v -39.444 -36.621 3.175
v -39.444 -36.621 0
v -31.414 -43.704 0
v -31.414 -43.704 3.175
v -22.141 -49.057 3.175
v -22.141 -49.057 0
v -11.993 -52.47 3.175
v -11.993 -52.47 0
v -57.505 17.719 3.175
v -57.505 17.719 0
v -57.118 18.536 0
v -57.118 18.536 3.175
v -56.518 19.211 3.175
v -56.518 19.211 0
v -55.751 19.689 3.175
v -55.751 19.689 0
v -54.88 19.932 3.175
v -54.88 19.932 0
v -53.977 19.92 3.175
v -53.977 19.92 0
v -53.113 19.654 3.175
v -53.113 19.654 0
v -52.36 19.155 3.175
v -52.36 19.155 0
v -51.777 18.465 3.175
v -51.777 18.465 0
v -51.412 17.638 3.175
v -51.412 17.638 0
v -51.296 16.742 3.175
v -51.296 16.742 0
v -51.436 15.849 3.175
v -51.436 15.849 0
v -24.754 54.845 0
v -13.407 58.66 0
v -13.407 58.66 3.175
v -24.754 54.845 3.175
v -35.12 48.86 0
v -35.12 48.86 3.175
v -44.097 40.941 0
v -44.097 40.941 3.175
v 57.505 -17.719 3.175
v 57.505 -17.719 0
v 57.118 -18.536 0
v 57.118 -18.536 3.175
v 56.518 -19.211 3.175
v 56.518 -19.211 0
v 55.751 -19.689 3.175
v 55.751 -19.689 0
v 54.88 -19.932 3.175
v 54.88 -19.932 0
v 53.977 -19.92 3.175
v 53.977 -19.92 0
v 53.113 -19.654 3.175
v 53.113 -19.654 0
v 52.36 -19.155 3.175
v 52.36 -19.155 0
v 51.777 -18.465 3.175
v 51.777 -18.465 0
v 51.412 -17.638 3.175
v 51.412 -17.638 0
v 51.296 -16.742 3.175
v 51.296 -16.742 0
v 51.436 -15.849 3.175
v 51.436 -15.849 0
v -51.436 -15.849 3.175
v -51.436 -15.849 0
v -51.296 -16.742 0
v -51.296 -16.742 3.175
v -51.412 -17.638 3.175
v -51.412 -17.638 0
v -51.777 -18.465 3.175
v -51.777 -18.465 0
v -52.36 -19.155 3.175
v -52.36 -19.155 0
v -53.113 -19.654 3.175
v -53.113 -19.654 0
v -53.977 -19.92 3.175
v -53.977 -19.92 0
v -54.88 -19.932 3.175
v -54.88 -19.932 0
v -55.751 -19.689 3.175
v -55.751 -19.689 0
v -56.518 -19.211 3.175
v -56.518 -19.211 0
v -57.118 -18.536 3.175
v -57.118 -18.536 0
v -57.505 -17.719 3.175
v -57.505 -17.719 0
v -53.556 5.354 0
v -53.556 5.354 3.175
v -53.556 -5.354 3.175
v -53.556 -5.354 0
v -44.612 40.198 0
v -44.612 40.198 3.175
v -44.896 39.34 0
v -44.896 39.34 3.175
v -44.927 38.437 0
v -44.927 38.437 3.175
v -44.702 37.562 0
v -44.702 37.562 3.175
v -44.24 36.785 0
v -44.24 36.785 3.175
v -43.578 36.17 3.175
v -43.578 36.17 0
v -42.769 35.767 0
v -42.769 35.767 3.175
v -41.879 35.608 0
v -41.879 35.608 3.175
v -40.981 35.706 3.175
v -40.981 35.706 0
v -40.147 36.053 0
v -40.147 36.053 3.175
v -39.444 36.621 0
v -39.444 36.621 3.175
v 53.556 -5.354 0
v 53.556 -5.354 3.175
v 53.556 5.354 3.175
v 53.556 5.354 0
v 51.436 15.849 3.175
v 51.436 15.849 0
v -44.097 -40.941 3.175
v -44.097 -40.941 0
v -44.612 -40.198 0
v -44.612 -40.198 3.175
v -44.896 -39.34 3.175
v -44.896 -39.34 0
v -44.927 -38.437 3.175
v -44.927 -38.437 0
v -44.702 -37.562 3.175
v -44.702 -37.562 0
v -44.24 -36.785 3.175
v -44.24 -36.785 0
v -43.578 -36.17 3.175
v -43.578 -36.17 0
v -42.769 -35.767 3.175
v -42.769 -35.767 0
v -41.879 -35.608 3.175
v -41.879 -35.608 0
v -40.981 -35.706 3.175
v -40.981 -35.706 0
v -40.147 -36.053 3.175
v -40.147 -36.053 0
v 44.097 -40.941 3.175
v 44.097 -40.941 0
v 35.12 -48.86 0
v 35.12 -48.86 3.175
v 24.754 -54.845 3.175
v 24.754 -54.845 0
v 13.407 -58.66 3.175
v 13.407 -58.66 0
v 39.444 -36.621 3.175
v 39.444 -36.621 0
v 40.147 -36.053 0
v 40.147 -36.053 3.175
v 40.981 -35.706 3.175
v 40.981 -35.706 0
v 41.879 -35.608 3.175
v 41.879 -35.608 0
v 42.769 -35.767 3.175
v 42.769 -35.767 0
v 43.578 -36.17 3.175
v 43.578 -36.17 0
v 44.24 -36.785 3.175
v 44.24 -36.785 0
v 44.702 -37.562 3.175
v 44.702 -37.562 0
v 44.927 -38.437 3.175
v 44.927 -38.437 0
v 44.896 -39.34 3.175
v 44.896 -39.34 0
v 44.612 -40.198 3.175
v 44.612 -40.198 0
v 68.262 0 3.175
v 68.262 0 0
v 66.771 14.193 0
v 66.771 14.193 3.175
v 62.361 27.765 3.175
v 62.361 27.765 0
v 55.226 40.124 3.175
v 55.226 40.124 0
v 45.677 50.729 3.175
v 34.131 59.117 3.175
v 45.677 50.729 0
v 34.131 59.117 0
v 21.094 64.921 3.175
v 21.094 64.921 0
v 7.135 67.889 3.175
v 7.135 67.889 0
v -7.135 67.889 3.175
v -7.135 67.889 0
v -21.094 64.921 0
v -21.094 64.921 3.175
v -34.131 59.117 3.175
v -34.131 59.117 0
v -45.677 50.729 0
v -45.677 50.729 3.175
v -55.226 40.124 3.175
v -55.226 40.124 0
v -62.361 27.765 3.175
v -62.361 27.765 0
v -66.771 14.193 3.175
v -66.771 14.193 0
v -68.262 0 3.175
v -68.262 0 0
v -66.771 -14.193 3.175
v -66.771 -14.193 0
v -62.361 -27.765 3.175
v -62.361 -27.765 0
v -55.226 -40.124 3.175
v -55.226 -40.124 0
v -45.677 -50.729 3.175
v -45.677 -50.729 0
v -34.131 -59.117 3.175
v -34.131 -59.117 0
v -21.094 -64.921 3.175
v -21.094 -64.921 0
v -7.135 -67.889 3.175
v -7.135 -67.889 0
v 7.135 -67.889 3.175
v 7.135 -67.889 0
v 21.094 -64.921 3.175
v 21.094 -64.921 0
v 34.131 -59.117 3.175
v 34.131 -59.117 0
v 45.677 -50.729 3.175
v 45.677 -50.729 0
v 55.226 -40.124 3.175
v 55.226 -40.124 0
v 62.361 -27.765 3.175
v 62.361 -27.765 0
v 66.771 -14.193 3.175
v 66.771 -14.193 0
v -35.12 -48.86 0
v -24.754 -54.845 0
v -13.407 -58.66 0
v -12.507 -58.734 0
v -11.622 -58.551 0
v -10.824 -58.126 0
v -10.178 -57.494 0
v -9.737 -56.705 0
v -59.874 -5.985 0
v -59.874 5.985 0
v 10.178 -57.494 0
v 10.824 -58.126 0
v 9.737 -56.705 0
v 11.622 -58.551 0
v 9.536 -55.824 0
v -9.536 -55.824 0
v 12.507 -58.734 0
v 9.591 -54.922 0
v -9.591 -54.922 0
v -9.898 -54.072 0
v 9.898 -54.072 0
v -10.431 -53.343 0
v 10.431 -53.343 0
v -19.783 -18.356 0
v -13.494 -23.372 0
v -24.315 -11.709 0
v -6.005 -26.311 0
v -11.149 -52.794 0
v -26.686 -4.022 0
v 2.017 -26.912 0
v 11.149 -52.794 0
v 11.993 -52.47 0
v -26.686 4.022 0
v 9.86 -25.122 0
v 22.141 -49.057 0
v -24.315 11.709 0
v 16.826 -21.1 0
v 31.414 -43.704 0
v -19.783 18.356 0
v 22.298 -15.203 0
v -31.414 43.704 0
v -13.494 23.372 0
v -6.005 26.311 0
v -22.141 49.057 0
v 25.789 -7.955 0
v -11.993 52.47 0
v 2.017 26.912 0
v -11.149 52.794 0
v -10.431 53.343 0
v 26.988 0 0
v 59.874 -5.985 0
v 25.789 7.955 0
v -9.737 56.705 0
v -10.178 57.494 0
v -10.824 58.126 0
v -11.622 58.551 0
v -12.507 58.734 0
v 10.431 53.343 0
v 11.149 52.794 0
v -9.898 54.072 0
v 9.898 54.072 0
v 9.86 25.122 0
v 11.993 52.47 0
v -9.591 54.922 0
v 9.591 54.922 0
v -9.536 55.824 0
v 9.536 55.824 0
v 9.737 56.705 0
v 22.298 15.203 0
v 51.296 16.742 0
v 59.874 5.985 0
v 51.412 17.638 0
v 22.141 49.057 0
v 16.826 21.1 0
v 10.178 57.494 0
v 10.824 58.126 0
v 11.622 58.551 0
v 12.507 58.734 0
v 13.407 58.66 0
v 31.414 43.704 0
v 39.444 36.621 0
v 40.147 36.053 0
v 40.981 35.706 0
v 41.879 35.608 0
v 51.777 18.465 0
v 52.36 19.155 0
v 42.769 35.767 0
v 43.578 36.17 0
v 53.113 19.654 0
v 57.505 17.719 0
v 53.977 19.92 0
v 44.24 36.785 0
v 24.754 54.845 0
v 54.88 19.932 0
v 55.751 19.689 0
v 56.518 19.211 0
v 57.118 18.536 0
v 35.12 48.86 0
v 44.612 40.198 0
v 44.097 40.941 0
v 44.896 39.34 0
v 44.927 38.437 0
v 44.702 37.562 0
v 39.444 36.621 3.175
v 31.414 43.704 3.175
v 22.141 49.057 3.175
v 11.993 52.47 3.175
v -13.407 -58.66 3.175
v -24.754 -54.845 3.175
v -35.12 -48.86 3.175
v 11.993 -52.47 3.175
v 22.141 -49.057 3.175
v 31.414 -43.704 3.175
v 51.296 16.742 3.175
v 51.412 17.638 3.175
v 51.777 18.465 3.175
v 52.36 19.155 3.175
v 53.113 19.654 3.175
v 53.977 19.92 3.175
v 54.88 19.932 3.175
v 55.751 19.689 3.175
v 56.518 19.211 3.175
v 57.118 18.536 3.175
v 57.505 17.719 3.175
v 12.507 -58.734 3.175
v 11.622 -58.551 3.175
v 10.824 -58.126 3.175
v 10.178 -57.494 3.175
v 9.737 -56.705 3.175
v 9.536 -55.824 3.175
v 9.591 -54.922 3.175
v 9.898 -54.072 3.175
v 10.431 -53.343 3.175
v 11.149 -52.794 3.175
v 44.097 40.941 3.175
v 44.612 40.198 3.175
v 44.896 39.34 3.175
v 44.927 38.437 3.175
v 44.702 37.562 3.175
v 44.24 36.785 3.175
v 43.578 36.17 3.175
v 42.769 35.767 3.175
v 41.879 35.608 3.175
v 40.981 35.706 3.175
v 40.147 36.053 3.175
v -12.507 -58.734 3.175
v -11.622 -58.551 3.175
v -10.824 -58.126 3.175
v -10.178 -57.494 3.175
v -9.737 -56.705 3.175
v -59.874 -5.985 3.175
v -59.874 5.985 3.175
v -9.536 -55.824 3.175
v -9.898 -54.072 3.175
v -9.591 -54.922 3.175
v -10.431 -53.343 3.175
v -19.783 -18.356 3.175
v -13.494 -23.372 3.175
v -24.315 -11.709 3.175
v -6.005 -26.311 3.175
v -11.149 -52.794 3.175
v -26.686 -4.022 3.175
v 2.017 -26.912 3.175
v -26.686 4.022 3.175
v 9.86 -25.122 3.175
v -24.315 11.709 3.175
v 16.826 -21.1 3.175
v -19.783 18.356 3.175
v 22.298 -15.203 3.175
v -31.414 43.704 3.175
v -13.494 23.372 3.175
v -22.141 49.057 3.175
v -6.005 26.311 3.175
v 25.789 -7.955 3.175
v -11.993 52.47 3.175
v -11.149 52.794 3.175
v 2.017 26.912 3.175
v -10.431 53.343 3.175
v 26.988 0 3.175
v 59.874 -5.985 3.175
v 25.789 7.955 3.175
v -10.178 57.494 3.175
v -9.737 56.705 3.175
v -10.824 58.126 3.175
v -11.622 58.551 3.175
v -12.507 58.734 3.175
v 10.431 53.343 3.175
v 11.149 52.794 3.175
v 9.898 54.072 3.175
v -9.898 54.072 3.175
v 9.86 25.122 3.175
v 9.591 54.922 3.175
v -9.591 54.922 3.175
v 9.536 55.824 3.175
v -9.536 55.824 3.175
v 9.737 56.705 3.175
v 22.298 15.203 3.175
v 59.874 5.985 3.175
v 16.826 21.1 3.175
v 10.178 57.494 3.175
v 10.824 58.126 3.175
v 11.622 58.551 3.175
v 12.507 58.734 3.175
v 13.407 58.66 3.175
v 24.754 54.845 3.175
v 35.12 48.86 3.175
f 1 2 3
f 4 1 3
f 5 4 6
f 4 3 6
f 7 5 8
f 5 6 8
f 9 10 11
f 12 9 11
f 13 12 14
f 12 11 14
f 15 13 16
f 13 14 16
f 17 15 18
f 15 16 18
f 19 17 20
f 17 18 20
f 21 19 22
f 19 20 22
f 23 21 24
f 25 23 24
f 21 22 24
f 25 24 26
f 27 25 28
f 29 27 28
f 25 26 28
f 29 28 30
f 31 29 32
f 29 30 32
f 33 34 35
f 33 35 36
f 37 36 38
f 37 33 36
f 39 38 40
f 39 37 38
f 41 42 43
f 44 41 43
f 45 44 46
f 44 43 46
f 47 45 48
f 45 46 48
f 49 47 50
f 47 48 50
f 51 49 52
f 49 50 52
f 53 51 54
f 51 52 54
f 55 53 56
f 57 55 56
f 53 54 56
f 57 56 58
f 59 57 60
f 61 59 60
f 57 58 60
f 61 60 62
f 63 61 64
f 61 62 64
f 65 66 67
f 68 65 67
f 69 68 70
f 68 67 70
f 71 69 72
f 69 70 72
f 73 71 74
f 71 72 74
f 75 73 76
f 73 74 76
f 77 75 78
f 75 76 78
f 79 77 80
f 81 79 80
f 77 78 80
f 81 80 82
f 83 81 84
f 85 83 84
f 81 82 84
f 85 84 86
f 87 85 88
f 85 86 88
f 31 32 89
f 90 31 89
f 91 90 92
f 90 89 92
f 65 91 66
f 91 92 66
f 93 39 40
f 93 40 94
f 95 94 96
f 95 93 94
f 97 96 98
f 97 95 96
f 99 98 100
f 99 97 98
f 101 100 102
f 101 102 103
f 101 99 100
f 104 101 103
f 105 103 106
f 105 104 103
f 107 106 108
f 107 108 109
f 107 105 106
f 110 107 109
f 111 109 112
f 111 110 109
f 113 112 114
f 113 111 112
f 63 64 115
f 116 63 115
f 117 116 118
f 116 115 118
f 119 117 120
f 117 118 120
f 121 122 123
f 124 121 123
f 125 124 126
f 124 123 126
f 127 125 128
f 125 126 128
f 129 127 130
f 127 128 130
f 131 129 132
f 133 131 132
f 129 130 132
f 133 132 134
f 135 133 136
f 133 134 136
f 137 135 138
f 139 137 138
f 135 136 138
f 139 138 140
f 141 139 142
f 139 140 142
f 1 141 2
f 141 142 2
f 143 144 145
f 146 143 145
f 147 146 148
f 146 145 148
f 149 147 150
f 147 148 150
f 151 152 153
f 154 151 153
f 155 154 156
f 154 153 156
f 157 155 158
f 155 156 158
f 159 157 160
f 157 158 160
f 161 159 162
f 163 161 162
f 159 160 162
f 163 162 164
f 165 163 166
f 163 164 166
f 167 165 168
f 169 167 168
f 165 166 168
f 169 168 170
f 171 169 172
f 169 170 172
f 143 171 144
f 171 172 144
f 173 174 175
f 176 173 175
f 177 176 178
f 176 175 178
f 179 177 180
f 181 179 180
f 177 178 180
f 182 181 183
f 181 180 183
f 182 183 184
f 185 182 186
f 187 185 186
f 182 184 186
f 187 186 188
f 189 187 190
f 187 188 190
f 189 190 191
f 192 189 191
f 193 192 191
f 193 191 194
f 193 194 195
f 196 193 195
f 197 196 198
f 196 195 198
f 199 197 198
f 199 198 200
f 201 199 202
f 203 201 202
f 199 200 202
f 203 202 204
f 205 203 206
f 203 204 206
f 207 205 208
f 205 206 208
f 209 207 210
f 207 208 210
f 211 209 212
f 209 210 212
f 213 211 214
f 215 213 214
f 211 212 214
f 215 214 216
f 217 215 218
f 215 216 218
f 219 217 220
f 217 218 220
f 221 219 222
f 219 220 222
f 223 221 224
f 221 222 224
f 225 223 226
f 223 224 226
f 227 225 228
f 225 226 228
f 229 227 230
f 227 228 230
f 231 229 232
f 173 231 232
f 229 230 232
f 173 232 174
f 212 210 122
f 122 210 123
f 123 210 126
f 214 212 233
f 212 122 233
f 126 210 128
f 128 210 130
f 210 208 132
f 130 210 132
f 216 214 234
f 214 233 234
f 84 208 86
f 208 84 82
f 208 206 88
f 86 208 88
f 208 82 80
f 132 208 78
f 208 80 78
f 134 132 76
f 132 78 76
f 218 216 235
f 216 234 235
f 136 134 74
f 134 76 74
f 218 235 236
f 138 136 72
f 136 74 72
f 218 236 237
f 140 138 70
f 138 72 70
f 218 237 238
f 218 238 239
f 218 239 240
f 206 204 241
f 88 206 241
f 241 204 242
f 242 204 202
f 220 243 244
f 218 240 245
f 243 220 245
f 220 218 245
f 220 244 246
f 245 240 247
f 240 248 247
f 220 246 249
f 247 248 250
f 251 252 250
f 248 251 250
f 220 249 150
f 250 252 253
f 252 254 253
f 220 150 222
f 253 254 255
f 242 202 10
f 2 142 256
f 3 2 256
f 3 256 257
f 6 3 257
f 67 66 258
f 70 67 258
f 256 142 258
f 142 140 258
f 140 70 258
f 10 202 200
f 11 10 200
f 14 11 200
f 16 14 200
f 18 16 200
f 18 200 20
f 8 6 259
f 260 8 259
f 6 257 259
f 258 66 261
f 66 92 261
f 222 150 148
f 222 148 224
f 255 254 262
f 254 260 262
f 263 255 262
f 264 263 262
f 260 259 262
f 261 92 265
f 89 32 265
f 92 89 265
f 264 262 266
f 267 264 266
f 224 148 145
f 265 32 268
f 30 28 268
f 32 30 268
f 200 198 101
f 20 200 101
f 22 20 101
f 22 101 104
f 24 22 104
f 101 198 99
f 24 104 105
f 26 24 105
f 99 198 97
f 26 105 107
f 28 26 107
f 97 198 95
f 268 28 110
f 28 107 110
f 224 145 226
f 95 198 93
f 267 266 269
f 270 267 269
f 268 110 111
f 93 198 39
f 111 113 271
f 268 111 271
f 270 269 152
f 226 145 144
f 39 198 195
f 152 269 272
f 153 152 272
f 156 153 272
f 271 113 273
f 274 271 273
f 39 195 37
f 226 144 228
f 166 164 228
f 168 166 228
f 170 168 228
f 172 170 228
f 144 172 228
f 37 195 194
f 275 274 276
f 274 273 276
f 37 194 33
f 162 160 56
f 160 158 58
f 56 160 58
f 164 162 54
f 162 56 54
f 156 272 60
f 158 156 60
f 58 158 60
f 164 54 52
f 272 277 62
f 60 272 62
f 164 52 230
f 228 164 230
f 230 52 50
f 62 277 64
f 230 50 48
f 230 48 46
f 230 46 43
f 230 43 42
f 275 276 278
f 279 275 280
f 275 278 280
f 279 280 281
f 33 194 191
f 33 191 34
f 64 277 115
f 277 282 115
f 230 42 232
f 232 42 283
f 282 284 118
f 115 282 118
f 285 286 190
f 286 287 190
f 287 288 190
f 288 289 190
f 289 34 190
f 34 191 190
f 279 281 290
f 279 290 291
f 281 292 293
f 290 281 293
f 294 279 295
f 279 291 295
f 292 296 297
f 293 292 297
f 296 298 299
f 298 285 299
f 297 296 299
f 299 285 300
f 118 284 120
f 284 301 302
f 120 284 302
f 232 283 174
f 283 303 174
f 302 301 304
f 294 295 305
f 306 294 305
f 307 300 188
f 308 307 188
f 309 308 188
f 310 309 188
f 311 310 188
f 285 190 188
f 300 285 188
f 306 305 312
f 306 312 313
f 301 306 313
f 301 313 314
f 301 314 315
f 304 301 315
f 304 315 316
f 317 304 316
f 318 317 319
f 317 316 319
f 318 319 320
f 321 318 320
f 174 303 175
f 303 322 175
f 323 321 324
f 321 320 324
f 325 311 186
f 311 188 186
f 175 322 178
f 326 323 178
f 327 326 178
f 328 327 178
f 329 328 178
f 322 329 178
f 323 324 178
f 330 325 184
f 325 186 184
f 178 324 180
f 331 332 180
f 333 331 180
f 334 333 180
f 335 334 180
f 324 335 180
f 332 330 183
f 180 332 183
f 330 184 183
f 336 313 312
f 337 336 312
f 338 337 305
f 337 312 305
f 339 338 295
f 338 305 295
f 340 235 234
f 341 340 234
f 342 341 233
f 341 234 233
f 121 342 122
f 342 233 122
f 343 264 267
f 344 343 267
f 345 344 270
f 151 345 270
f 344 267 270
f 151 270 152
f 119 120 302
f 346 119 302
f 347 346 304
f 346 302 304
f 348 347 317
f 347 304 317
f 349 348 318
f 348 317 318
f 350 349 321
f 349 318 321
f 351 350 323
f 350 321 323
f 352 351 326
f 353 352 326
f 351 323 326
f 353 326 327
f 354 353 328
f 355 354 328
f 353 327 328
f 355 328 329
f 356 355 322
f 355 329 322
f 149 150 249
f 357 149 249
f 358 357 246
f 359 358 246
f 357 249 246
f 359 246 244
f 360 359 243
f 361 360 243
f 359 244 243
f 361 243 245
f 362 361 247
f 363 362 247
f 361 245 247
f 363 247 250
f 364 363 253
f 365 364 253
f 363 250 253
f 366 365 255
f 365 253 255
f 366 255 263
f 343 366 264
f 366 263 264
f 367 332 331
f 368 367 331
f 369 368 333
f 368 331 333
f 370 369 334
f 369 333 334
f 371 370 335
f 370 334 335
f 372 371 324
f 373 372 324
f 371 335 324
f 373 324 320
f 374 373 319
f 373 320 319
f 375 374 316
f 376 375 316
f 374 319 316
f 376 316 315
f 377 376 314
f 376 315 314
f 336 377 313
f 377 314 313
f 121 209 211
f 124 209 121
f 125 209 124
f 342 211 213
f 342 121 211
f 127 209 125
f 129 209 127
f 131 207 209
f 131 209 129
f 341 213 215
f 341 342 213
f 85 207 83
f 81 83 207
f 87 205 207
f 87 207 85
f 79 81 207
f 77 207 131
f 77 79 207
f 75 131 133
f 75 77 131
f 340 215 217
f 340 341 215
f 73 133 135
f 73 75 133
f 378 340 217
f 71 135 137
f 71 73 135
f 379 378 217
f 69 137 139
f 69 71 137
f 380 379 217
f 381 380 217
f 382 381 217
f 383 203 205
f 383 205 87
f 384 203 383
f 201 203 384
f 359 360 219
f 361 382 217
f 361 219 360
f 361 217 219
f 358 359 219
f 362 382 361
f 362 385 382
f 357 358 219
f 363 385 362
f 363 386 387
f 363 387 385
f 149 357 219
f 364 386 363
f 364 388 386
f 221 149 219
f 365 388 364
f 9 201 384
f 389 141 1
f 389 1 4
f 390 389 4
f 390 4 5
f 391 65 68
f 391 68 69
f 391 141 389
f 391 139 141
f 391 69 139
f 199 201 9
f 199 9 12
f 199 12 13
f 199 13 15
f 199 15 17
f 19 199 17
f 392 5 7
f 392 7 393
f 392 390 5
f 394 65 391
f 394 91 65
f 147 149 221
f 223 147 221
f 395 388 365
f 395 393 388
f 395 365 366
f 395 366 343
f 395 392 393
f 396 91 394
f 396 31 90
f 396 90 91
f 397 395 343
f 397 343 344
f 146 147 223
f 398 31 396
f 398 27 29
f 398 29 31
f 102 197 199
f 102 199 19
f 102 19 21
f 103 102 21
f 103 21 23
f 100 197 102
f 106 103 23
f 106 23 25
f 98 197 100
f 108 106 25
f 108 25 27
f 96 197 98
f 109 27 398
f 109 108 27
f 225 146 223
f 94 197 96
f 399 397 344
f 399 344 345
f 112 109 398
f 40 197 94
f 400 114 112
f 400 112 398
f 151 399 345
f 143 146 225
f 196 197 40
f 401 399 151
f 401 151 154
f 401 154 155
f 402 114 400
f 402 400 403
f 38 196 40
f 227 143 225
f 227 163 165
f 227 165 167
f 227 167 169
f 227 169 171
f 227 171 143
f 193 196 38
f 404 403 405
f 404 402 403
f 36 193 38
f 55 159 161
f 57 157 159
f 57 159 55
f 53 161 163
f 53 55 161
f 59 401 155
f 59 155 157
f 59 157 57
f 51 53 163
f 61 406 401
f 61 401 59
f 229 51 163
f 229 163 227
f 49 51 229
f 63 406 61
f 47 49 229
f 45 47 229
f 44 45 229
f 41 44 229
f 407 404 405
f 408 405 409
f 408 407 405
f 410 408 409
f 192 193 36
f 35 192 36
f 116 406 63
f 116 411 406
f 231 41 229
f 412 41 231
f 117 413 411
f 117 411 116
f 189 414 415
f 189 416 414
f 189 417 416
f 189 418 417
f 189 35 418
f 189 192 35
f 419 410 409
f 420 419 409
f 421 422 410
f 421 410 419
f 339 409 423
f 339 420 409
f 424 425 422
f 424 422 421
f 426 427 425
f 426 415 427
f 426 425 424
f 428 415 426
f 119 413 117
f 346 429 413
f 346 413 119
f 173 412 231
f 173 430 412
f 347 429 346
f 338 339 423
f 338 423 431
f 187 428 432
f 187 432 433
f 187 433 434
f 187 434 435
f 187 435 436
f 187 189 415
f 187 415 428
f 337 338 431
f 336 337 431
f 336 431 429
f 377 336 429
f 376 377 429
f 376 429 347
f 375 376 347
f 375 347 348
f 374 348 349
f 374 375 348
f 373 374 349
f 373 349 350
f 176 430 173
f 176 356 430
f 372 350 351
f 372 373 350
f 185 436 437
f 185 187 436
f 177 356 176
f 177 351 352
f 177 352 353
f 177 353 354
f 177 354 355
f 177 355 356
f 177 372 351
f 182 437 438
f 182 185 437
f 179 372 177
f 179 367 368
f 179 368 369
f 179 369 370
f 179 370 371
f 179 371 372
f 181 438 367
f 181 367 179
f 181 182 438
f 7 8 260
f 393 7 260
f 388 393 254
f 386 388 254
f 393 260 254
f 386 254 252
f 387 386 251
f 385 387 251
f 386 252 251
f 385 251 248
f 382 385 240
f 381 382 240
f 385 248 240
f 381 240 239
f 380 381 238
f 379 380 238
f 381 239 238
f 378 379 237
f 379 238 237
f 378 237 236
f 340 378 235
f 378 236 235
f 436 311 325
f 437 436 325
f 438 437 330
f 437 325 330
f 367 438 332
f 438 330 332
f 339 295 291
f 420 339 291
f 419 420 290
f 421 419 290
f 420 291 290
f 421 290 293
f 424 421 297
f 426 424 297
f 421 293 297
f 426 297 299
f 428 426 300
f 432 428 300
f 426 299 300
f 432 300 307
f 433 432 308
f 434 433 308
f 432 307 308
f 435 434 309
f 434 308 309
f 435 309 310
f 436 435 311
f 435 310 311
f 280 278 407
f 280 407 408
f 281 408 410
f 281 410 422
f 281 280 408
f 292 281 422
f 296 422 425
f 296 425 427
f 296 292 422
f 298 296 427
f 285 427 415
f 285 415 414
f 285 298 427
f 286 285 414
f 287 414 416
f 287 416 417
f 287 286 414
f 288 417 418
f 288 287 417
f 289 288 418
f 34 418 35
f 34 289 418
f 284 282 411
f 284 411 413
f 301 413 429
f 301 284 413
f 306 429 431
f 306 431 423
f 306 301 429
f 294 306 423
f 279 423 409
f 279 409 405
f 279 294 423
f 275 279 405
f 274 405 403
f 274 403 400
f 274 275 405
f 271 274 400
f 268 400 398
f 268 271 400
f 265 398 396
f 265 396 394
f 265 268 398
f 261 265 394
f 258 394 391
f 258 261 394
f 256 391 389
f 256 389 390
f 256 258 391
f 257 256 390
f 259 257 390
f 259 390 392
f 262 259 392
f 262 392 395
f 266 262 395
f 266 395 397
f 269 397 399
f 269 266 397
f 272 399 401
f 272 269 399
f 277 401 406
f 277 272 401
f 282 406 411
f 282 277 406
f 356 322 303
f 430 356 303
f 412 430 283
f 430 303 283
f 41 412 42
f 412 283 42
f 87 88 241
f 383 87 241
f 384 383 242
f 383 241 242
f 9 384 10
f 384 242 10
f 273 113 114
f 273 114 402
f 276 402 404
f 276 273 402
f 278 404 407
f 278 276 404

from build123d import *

# Parameters (mm, degrees)
SKETCH1_R           = 68.2625
SKETCH1_R_2         = 26.9875
BOSS_EXTRUDE1_DEPTH = 3.175


with BuildPart() as part:
    # Sketch1 → Boss-Extrude1 (new body)
    with BuildSketch(Plane.XY):
        Circle(SKETCH1_R)
        Circle(SKETCH1_R_2, mode=Mode.SUBTRACT)
        with BuildLine():
            ThreePointArc((-13.407442068, 58.659886532), (-30.0863, 52.111000212), (-44.097230886, 40.941128696))
            ThreePointArc((-44.097230886, 40.941128696), (-43.930699534, 36.454089884), (-39.443660721, 36.620621236))
            ThreePointArc((-39.443660721, 36.620621236), (-26.9113, 46.611738898), (-11.992557932, 52.46952282))
            ThreePointArc((-11.992557932, 52.46952282), (-9.604818144, 56.272146744), (-13.407442068, 58.659886532))
        make_face(mode=Mode.SUBTRACT)
        with BuildLine():
            ThreePointArc((39.443660721, 36.620621236), (26.9113, 46.611738898), (11.992557932, 52.46952282))
            ThreePointArc((11.992557932, 52.46952282), (9.604818144, 56.272146744), (13.407442068, 58.659886532))
            ThreePointArc((13.407442068, 58.659886532), (30.0863, 52.111000212), (44.097230886, 40.941128696))
            ThreePointArc((44.097230886, 40.941128696), (43.930699534, 36.454089884), (39.443660721, 36.620621236))
        make_face(mode=Mode.SUBTRACT)
        with BuildLine():
            ThreePointArc((51.436218653, -15.848901585), (53.8226, 0), (51.436218653, 15.848901585))
            ThreePointArc((51.436218653, 15.848901585), (53.535517678, 19.81805686), (57.504672954, 17.718757836))
            ThreePointArc((57.504672954, 17.718757836), (60.1726, 0), (57.504672954, -17.718757836))
            ThreePointArc((57.504672954, -17.718757836), (53.535517678, -19.81805686), (51.436218653, -15.848901585))
        make_face(mode=Mode.SUBTRACT)
        with BuildLine():
            ThreePointArc((11.992557932, -52.46952282), (26.9113, -46.611738898), (39.443660721, -36.620621236))
            ThreePointArc((39.443660721, -36.620621236), (43.930699534, -36.454089884), (44.097230886, -40.941128696))
            ThreePointArc((44.097230886, -40.941128696), (30.0863, -52.111000212), (13.407442068, -58.659886532))
            ThreePointArc((13.407442068, -58.659886532), (9.604818144, -56.272146744), (11.992557932, -52.46952282))
        make_face(mode=Mode.SUBTRACT)
        with BuildLine():
            ThreePointArc((-39.443660721, -36.620621236), (-26.9113, -46.611738898), (-11.992557932, -52.46952282))
            ThreePointArc((-11.992557932, -52.46952282), (-9.604818144, -56.272146744), (-13.407442068, -58.659886532))
            ThreePointArc((-13.407442068, -58.659886532), (-30.0863, -52.111000212), (-44.097230886, -40.941128696))
            ThreePointArc((-44.097230886, -40.941128696), (-43.930699534, -36.454089884), (-39.443660721, -36.620621236))
        make_face(mode=Mode.SUBTRACT)
        with BuildLine():
            ThreePointArc((-51.436218653, 15.848901585), (-53.8226, 0), (-51.436218653, -15.848901585))
            ThreePointArc((-51.436218653, -15.848901585), (-53.535517678, -19.81805686), (-57.504672954, -17.718757836))
            ThreePointArc((-57.504672954, -17.718757836), (-60.1726, 0), (-57.504672954, 17.718757836))
            ThreePointArc((-57.504672954, 17.718757836), (-53.535517678, 19.81805686), (-51.436218653, 15.848901585))
        make_face(mode=Mode.SUBTRACT)
    extrude(amount=BOSS_EXTRUDE1_DEPTH)


solid = part.part
